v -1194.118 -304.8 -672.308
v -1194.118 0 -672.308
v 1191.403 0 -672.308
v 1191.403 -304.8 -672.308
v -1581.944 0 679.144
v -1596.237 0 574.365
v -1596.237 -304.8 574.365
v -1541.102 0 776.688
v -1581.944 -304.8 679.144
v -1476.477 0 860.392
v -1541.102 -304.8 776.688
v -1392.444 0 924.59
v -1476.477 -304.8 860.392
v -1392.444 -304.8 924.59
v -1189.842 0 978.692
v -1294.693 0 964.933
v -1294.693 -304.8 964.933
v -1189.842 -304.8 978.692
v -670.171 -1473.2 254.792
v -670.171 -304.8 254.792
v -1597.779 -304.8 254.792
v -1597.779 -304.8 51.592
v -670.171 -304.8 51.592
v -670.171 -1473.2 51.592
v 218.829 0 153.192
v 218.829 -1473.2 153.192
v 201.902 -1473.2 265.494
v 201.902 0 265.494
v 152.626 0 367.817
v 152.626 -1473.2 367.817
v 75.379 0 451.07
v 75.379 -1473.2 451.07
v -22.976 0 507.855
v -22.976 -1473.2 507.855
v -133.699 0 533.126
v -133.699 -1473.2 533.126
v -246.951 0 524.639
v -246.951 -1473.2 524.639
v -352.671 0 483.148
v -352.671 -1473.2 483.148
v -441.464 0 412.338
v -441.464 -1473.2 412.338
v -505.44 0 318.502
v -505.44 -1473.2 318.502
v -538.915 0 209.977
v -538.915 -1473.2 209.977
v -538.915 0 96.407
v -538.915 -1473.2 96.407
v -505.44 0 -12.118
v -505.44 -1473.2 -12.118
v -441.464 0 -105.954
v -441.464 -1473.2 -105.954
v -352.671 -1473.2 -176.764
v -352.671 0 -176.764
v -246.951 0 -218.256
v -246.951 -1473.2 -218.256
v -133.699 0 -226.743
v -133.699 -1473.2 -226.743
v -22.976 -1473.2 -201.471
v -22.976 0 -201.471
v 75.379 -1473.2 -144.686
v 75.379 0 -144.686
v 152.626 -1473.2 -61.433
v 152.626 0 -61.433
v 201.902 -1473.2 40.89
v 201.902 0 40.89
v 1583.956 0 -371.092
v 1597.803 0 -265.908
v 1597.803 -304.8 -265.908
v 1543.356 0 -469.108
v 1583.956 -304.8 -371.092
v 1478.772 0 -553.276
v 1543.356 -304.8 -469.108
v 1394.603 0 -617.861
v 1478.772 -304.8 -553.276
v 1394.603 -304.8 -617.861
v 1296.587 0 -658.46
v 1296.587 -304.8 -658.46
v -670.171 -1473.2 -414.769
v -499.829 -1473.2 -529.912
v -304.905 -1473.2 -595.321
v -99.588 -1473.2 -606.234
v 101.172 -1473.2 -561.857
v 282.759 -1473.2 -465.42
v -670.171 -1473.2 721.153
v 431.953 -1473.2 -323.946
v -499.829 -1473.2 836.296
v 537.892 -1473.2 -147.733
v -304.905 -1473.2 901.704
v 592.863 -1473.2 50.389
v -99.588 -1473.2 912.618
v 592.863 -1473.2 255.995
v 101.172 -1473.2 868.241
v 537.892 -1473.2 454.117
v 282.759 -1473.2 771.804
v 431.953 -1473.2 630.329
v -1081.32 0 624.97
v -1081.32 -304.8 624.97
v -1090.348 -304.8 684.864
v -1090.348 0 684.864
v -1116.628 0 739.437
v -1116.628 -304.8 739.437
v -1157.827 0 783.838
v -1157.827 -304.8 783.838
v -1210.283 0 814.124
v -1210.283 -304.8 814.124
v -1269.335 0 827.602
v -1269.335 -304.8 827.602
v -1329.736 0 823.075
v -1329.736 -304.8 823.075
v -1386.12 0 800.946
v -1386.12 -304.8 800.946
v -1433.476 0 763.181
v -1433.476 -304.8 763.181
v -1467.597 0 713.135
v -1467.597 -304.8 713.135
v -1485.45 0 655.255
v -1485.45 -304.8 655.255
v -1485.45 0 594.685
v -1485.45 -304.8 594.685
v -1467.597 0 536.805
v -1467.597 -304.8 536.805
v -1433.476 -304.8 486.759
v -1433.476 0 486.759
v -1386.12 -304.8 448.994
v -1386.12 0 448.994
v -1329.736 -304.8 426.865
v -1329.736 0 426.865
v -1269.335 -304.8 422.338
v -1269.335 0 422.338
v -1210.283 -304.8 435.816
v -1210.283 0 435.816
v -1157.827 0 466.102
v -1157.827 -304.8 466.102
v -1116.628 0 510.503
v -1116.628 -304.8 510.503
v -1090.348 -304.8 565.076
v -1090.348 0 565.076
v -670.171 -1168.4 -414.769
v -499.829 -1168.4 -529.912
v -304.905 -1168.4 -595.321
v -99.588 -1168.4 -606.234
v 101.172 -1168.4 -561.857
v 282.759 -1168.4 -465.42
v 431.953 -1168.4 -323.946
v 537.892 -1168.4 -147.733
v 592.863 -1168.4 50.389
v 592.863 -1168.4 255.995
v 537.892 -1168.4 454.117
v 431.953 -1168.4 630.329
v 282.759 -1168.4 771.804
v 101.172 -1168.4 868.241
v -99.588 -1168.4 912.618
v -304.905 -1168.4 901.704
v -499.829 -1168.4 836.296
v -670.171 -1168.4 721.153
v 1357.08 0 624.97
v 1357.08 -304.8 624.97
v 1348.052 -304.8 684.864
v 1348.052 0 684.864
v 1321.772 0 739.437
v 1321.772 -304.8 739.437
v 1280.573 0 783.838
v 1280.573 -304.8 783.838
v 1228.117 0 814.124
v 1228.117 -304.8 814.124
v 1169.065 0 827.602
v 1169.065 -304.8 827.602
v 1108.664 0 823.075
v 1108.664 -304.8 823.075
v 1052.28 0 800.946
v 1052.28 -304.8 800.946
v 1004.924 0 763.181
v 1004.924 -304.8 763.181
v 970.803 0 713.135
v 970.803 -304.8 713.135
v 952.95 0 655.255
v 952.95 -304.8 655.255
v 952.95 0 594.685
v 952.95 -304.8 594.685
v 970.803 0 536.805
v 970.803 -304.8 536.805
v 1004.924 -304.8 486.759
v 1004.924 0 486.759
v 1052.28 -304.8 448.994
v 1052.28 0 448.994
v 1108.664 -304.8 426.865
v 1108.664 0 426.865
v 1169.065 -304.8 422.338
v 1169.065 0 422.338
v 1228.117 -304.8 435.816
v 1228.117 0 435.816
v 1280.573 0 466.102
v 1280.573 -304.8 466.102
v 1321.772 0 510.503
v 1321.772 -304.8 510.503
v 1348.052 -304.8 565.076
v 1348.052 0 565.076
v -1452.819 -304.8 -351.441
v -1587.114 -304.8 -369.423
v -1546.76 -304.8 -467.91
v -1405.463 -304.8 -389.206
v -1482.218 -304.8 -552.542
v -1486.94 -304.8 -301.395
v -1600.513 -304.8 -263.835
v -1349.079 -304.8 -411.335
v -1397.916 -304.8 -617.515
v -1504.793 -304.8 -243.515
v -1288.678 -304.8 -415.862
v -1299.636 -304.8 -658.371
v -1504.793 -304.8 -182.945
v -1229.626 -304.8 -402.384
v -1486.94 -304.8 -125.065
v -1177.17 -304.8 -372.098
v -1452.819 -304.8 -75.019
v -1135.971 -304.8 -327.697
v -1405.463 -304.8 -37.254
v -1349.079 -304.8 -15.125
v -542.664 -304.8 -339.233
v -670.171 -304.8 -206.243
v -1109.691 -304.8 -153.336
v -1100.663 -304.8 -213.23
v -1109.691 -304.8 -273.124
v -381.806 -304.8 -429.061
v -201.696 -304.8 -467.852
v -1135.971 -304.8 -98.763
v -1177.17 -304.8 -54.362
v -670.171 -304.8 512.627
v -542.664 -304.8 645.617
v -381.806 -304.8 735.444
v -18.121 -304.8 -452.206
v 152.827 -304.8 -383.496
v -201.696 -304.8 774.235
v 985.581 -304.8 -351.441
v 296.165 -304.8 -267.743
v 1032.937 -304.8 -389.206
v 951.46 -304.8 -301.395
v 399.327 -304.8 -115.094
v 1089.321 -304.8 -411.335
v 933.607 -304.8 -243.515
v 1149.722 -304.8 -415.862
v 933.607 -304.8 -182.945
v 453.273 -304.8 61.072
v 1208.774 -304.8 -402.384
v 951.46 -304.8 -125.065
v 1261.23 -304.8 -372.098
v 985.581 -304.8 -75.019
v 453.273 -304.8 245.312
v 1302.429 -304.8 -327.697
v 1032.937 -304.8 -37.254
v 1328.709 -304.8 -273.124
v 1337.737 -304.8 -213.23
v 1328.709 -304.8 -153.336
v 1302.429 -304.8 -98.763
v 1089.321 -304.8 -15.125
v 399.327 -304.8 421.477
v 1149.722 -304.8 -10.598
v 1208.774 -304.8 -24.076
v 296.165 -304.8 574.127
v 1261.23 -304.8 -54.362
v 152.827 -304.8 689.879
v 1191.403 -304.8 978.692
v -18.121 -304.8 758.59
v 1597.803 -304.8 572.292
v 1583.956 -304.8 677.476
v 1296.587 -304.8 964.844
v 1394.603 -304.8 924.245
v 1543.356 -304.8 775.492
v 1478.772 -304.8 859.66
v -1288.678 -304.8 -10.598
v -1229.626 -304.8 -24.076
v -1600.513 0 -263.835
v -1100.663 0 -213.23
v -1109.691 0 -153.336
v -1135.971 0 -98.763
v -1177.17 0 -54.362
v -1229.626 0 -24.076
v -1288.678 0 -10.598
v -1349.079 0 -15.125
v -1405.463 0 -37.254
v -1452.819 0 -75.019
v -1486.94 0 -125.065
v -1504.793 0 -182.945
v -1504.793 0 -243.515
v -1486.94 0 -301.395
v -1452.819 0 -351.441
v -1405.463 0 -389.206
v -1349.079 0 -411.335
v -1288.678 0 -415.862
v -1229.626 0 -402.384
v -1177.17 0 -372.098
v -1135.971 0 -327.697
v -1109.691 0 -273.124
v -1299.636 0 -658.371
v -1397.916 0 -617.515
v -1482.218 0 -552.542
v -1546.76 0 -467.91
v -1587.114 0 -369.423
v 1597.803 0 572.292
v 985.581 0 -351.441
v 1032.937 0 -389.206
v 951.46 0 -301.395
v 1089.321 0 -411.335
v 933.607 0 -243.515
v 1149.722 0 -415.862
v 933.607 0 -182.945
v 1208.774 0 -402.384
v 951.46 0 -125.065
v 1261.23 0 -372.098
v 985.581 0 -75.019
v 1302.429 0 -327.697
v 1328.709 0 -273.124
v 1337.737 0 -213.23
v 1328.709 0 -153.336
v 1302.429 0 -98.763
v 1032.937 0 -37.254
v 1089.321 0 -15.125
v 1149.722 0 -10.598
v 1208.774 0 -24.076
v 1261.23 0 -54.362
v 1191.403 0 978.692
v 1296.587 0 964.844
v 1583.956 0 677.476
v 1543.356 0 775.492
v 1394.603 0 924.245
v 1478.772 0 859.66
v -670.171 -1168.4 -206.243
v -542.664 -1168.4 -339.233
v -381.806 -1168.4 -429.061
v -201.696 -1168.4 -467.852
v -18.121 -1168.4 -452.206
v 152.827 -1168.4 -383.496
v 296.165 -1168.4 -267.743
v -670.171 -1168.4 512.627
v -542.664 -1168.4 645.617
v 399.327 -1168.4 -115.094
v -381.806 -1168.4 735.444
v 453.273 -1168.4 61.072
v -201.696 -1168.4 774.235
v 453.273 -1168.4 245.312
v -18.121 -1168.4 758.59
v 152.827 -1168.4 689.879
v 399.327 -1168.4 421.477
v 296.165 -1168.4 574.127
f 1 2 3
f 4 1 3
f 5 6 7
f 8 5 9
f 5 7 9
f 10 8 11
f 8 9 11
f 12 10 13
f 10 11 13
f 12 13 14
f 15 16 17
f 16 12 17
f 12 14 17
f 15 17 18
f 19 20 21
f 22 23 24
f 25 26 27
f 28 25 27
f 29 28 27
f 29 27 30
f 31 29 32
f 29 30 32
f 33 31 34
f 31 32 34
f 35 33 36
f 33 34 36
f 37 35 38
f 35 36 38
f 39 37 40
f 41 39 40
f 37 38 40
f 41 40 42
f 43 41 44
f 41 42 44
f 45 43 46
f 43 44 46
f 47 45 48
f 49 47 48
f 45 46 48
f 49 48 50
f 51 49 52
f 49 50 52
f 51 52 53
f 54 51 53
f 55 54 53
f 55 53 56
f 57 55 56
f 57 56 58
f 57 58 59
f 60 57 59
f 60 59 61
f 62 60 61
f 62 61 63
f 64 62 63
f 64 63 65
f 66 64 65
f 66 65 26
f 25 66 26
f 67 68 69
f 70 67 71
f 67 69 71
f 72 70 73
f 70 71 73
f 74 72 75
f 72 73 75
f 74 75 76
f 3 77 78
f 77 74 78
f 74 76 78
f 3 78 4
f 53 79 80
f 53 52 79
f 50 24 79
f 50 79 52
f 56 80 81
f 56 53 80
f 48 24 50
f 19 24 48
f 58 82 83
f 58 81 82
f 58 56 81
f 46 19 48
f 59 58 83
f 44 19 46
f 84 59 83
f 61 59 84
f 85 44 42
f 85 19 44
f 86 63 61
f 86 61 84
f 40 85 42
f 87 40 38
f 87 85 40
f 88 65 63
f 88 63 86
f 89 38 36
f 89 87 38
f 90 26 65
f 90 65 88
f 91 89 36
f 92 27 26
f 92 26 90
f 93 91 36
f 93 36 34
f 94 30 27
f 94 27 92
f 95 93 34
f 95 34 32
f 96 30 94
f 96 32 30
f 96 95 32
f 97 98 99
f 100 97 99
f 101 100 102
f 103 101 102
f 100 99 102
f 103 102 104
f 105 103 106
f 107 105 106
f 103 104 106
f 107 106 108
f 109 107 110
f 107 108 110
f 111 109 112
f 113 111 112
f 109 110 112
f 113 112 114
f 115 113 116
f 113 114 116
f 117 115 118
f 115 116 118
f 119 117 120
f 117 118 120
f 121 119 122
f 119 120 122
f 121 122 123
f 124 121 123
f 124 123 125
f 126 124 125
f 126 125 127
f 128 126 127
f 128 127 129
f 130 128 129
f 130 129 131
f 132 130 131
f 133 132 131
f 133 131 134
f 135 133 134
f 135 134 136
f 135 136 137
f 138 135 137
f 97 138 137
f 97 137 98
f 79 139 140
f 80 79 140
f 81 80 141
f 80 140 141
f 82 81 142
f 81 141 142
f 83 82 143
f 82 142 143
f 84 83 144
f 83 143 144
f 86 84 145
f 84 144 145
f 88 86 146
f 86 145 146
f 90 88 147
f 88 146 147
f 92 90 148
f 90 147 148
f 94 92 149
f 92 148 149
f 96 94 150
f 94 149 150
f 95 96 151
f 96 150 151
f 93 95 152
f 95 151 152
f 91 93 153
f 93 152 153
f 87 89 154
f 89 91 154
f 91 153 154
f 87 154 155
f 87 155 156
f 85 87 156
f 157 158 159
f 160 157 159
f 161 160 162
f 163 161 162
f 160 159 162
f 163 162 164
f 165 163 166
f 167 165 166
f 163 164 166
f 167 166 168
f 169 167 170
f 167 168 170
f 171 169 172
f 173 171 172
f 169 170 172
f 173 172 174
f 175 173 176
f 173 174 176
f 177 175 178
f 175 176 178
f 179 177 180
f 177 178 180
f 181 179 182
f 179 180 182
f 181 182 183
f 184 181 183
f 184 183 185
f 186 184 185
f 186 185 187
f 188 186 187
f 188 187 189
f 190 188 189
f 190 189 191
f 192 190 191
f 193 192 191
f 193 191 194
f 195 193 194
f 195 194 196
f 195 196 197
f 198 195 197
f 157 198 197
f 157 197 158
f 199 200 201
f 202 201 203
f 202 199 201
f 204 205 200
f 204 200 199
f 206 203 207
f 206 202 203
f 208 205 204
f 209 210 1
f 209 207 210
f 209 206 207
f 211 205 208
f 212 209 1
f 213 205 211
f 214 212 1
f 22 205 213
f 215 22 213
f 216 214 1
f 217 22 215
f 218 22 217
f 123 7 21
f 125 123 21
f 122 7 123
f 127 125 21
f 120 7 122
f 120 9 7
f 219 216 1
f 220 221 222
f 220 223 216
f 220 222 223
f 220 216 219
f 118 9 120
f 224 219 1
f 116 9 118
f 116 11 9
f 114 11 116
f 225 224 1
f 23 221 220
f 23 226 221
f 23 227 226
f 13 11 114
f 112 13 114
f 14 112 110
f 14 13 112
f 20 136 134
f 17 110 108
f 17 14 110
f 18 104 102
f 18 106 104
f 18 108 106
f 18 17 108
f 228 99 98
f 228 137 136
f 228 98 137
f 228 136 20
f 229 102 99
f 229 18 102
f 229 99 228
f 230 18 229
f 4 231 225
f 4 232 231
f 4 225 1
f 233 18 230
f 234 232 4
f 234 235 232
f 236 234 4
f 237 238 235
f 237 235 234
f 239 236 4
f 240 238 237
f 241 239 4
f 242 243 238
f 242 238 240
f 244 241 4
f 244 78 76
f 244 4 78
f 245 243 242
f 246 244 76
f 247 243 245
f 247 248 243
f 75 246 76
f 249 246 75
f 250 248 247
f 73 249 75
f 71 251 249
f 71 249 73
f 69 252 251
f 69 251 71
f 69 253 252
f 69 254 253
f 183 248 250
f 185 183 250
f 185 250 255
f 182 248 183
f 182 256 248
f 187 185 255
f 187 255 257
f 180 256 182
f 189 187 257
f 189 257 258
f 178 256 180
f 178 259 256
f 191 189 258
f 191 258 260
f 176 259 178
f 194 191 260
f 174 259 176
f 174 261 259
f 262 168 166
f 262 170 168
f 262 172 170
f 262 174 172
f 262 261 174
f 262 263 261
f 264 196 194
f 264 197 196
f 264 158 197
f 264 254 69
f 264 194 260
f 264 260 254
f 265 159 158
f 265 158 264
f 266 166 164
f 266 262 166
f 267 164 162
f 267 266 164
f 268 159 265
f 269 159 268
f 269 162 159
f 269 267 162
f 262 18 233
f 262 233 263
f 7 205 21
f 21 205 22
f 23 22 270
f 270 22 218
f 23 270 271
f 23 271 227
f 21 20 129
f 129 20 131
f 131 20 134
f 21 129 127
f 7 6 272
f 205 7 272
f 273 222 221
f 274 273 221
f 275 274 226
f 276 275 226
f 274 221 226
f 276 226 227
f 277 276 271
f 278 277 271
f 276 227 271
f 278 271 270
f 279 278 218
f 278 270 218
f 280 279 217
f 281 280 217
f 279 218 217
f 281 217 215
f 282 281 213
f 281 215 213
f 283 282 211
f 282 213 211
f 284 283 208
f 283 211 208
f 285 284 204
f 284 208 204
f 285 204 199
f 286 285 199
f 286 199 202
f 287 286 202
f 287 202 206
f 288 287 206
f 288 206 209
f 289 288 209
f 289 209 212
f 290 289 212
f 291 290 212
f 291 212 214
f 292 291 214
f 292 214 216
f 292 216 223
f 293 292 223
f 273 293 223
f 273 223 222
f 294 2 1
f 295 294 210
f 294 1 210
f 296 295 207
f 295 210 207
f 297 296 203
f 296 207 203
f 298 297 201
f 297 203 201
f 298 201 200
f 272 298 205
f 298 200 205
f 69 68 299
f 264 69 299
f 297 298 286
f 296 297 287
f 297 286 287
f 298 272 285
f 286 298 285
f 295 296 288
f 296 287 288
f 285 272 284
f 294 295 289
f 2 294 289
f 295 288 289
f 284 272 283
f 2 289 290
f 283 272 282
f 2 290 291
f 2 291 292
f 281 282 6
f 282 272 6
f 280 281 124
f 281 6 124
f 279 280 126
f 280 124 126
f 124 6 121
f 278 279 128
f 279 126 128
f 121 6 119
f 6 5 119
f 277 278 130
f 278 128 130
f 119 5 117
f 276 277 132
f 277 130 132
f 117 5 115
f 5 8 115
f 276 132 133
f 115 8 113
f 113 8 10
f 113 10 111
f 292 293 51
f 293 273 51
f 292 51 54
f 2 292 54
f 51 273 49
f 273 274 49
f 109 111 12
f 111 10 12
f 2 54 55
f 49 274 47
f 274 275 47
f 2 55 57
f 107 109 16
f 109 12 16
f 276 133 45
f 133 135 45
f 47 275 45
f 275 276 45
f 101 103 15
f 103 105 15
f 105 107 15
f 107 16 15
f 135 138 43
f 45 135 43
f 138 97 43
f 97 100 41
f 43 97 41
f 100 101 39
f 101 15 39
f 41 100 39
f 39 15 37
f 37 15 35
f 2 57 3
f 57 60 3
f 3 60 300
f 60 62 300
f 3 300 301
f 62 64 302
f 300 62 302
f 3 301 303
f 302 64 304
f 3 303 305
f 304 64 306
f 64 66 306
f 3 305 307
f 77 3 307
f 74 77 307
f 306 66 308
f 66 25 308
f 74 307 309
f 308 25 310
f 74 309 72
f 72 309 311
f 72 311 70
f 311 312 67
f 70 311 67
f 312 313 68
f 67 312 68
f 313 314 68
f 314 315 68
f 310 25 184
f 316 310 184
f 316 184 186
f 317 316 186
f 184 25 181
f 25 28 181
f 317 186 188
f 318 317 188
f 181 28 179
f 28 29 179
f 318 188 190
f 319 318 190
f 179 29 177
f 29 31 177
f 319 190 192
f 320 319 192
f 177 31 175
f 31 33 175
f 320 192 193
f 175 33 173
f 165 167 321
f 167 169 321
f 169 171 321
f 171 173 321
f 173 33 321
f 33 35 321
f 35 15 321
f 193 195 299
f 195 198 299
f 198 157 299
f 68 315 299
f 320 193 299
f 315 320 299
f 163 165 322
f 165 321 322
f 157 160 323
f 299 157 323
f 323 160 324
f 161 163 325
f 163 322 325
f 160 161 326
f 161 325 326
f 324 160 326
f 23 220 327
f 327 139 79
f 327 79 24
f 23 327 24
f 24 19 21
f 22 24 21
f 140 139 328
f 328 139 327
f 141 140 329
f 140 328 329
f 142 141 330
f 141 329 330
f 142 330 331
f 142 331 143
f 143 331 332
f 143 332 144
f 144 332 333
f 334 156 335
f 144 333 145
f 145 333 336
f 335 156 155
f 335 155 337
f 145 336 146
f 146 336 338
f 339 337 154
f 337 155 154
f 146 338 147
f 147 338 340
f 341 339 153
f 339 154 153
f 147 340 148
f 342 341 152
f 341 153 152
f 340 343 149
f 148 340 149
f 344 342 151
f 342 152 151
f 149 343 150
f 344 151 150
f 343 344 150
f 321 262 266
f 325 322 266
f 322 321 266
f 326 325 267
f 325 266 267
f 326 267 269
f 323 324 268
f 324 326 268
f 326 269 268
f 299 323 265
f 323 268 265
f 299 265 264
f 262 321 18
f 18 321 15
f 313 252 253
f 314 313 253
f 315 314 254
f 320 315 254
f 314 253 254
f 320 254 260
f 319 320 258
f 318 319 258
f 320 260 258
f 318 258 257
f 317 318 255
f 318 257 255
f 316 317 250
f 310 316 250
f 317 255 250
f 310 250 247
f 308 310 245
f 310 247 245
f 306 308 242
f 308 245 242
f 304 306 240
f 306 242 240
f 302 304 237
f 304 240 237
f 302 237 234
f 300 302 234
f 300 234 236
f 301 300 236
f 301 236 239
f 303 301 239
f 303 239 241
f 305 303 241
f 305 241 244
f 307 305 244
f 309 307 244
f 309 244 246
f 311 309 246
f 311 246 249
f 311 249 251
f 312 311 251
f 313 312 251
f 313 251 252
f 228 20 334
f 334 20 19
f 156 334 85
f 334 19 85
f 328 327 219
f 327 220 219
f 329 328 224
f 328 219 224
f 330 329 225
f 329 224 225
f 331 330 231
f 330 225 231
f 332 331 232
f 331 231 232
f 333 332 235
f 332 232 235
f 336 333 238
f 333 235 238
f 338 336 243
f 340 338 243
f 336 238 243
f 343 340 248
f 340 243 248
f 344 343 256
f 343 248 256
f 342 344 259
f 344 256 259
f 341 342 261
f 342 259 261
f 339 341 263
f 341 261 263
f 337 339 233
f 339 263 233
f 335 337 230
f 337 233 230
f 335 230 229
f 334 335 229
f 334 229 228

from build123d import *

# Parameters (mm, degrees)
F1_DEPTH  = 304.8
F2_R      = 203.2
F3_DEPTH  = 304.801
F4_R      = 622.3
F5_DEPTH  = 863.6
F6_R      = 762
F6_R_2    = 622.3
F7_DEPTH  = 304.8
F8_R      = 381
F9_DEPTH  = 1473.201
F11_DEPTH = 1168.4
F12_W     = 1168.4
F12_H     = 203.2
F13_DEPTH = 927.608
F15_DEPTH = 203.2
F17_DEPTH = 304.801


with BuildPart() as f1:
    # F0 (on Front) → F1 (new body)
    with BuildSketch(Plane.XZ):
        Polygon((1597.8033866405, 978.6918288183), (-1594.1745716925, 978.6918288183), (-1602.5966133595, -672.3081711817), (1597.8033866405, -672.3081711817), align=None)
    extrude(amount=F1_DEPTH)

    # F2 (on face) → F3 (cut, through all)
    with BuildSketch(Plane.XZ.offset(304.8)):
        with Locations((-1284.5199181577, 624.9700057066)):
            Circle(F2_R)
        with Locations((-1303.8630485535, -213.2299942934)):
            Circle(F2_R)
        with Locations((1134.5369514465, -213.2299942934)):
            Circle(F2_R)
        with Locations((1153.8800818423, 624.9700057066)):
            Circle(F2_R)
    extrude(amount=-F3_DEPTH, mode=Mode.SUBTRACT)

    # F4 (on face) → F5 (join)
    with BuildSketch(Plane.XZ.offset(304.8)):
        with Locations((-162.1708273888, 153.1918288183)):
            Circle(F4_R)
    extrude(amount=F5_DEPTH)

    # F6 (on face) → F7 (join)
    with BuildSketch(Plane.XZ.offset(1168.4)):
        with Locations((-162.1708273888, 153.1918288183)):
            Circle(F6_R)
        with Locations((-162.1708273888, 153.1918288183)):
            Circle(F6_R_2, mode=Mode.SUBTRACT)
        with Locations((-162.1708273888, 153.1918288183)):
            Circle(F6_R_2)
    extrude(amount=F7_DEPTH)

    # F8 (on face) → F9 (cut, through all)
    with BuildSketch(Plane.XZ.offset(1473.2)):
        with Locations((-162.1708273888, 153.1918288183)):
            Circle(F8_R)
    extrude(amount=-F9_DEPTH, mode=Mode.SUBTRACT)

    # F10 (on face) → F11 (cut, through all)
    with BuildSketch(Plane.XZ.offset(1473.2)):
        with BuildLine():
            Line((-670.1708273888, -414.7694374667), (-670.1708273888, 721.1530951032))
            ThreePointArc((-670.1708273888, 721.1530951032), (-924.1708273888, 153.1918288183), (-670.1708273888, -414.7694374667))
        make_face()
    extrude(amount=-F11_DEPTH, mode=Mode.SUBTRACT)

    # F12 (on face) → F13 (join)
    with BuildSketch(Plane(origin=(-670.1708273888, 0, 0), x_dir=(0, -1, 0), z_dir=(-1, 0, 0))):
        with Locations((889, 153.1918288183)):
            Rectangle(F12_W, F12_H)
    extrude(amount=F13_DEPTH)

    # F14 (on face) → F15 (cut, through all)
    with BuildSketch(Plane.XY.offset(254.7918288183)):
        Polygon((-1597.7788273888, -1473.2), (-670.1708273888, -1473.2), (-1597.7788273888, -304.8), align=None)
    extrude(amount=-F15_DEPTH, mode=Mode.SUBTRACT)

    # F16 (on face) → F17 (cut, through all)
    with BuildSketch(Plane.XZ.offset(304.8)):
        with BuildLine():
            ThreePointArc((1597.8033866405, -265.9081711817), (1478.7715825148, -553.276367056), (1191.4033866405, -672.3081711817))
            Line((1191.4033866405, -672.3081711817), (1597.8033866405, -672.3081711817))
            Line((1597.8033866405, -672.3081711817), (1597.8033866405, -265.9081711817))
        make_face()
        with BuildLine():
            ThreePointArc((1191.4033866405, 978.6918288183), (1478.7715825148, 859.6600246925), (1597.8033866405, 572.2918288183))
            Line((1597.8033866405, 572.2918288183), (1597.8033866405, 978.6918288183))
            Line((1597.8033866405, 978.6918288183), (1191.4033866405, 978.6918288183))
        make_face()
        with BuildLine():
            Line((-1602.5966133595, -672.3081711817), (-1194.1182077752, -672.3081711817))
            ThreePointArc((-1194.1182077752, -672.3081711817), (-1482.218419657, -552.5424816082), (-1600.5129202086, -263.8350802058))
            Line((-1600.5129202086, -263.8350802057), (-1602.5966133595, -672.3081711817))
        make_face()
        with BuildLine():
            Line((-1594.1745716925, 978.6918288183), (-1596.2371144392, 574.3649197942))
            ThreePointArc((-1596.2371144392, 574.3649197942), (-1476.4767124324, 860.3920407), (-1189.8424020058, 978.6918288183))
            Line((-1189.8424020058, 978.6918288183), (-1594.1745716925, 978.6918288183))
        make_face()
    extrude(amount=-F17_DEPTH, mode=Mode.SUBTRACT)


solid = f1.part
